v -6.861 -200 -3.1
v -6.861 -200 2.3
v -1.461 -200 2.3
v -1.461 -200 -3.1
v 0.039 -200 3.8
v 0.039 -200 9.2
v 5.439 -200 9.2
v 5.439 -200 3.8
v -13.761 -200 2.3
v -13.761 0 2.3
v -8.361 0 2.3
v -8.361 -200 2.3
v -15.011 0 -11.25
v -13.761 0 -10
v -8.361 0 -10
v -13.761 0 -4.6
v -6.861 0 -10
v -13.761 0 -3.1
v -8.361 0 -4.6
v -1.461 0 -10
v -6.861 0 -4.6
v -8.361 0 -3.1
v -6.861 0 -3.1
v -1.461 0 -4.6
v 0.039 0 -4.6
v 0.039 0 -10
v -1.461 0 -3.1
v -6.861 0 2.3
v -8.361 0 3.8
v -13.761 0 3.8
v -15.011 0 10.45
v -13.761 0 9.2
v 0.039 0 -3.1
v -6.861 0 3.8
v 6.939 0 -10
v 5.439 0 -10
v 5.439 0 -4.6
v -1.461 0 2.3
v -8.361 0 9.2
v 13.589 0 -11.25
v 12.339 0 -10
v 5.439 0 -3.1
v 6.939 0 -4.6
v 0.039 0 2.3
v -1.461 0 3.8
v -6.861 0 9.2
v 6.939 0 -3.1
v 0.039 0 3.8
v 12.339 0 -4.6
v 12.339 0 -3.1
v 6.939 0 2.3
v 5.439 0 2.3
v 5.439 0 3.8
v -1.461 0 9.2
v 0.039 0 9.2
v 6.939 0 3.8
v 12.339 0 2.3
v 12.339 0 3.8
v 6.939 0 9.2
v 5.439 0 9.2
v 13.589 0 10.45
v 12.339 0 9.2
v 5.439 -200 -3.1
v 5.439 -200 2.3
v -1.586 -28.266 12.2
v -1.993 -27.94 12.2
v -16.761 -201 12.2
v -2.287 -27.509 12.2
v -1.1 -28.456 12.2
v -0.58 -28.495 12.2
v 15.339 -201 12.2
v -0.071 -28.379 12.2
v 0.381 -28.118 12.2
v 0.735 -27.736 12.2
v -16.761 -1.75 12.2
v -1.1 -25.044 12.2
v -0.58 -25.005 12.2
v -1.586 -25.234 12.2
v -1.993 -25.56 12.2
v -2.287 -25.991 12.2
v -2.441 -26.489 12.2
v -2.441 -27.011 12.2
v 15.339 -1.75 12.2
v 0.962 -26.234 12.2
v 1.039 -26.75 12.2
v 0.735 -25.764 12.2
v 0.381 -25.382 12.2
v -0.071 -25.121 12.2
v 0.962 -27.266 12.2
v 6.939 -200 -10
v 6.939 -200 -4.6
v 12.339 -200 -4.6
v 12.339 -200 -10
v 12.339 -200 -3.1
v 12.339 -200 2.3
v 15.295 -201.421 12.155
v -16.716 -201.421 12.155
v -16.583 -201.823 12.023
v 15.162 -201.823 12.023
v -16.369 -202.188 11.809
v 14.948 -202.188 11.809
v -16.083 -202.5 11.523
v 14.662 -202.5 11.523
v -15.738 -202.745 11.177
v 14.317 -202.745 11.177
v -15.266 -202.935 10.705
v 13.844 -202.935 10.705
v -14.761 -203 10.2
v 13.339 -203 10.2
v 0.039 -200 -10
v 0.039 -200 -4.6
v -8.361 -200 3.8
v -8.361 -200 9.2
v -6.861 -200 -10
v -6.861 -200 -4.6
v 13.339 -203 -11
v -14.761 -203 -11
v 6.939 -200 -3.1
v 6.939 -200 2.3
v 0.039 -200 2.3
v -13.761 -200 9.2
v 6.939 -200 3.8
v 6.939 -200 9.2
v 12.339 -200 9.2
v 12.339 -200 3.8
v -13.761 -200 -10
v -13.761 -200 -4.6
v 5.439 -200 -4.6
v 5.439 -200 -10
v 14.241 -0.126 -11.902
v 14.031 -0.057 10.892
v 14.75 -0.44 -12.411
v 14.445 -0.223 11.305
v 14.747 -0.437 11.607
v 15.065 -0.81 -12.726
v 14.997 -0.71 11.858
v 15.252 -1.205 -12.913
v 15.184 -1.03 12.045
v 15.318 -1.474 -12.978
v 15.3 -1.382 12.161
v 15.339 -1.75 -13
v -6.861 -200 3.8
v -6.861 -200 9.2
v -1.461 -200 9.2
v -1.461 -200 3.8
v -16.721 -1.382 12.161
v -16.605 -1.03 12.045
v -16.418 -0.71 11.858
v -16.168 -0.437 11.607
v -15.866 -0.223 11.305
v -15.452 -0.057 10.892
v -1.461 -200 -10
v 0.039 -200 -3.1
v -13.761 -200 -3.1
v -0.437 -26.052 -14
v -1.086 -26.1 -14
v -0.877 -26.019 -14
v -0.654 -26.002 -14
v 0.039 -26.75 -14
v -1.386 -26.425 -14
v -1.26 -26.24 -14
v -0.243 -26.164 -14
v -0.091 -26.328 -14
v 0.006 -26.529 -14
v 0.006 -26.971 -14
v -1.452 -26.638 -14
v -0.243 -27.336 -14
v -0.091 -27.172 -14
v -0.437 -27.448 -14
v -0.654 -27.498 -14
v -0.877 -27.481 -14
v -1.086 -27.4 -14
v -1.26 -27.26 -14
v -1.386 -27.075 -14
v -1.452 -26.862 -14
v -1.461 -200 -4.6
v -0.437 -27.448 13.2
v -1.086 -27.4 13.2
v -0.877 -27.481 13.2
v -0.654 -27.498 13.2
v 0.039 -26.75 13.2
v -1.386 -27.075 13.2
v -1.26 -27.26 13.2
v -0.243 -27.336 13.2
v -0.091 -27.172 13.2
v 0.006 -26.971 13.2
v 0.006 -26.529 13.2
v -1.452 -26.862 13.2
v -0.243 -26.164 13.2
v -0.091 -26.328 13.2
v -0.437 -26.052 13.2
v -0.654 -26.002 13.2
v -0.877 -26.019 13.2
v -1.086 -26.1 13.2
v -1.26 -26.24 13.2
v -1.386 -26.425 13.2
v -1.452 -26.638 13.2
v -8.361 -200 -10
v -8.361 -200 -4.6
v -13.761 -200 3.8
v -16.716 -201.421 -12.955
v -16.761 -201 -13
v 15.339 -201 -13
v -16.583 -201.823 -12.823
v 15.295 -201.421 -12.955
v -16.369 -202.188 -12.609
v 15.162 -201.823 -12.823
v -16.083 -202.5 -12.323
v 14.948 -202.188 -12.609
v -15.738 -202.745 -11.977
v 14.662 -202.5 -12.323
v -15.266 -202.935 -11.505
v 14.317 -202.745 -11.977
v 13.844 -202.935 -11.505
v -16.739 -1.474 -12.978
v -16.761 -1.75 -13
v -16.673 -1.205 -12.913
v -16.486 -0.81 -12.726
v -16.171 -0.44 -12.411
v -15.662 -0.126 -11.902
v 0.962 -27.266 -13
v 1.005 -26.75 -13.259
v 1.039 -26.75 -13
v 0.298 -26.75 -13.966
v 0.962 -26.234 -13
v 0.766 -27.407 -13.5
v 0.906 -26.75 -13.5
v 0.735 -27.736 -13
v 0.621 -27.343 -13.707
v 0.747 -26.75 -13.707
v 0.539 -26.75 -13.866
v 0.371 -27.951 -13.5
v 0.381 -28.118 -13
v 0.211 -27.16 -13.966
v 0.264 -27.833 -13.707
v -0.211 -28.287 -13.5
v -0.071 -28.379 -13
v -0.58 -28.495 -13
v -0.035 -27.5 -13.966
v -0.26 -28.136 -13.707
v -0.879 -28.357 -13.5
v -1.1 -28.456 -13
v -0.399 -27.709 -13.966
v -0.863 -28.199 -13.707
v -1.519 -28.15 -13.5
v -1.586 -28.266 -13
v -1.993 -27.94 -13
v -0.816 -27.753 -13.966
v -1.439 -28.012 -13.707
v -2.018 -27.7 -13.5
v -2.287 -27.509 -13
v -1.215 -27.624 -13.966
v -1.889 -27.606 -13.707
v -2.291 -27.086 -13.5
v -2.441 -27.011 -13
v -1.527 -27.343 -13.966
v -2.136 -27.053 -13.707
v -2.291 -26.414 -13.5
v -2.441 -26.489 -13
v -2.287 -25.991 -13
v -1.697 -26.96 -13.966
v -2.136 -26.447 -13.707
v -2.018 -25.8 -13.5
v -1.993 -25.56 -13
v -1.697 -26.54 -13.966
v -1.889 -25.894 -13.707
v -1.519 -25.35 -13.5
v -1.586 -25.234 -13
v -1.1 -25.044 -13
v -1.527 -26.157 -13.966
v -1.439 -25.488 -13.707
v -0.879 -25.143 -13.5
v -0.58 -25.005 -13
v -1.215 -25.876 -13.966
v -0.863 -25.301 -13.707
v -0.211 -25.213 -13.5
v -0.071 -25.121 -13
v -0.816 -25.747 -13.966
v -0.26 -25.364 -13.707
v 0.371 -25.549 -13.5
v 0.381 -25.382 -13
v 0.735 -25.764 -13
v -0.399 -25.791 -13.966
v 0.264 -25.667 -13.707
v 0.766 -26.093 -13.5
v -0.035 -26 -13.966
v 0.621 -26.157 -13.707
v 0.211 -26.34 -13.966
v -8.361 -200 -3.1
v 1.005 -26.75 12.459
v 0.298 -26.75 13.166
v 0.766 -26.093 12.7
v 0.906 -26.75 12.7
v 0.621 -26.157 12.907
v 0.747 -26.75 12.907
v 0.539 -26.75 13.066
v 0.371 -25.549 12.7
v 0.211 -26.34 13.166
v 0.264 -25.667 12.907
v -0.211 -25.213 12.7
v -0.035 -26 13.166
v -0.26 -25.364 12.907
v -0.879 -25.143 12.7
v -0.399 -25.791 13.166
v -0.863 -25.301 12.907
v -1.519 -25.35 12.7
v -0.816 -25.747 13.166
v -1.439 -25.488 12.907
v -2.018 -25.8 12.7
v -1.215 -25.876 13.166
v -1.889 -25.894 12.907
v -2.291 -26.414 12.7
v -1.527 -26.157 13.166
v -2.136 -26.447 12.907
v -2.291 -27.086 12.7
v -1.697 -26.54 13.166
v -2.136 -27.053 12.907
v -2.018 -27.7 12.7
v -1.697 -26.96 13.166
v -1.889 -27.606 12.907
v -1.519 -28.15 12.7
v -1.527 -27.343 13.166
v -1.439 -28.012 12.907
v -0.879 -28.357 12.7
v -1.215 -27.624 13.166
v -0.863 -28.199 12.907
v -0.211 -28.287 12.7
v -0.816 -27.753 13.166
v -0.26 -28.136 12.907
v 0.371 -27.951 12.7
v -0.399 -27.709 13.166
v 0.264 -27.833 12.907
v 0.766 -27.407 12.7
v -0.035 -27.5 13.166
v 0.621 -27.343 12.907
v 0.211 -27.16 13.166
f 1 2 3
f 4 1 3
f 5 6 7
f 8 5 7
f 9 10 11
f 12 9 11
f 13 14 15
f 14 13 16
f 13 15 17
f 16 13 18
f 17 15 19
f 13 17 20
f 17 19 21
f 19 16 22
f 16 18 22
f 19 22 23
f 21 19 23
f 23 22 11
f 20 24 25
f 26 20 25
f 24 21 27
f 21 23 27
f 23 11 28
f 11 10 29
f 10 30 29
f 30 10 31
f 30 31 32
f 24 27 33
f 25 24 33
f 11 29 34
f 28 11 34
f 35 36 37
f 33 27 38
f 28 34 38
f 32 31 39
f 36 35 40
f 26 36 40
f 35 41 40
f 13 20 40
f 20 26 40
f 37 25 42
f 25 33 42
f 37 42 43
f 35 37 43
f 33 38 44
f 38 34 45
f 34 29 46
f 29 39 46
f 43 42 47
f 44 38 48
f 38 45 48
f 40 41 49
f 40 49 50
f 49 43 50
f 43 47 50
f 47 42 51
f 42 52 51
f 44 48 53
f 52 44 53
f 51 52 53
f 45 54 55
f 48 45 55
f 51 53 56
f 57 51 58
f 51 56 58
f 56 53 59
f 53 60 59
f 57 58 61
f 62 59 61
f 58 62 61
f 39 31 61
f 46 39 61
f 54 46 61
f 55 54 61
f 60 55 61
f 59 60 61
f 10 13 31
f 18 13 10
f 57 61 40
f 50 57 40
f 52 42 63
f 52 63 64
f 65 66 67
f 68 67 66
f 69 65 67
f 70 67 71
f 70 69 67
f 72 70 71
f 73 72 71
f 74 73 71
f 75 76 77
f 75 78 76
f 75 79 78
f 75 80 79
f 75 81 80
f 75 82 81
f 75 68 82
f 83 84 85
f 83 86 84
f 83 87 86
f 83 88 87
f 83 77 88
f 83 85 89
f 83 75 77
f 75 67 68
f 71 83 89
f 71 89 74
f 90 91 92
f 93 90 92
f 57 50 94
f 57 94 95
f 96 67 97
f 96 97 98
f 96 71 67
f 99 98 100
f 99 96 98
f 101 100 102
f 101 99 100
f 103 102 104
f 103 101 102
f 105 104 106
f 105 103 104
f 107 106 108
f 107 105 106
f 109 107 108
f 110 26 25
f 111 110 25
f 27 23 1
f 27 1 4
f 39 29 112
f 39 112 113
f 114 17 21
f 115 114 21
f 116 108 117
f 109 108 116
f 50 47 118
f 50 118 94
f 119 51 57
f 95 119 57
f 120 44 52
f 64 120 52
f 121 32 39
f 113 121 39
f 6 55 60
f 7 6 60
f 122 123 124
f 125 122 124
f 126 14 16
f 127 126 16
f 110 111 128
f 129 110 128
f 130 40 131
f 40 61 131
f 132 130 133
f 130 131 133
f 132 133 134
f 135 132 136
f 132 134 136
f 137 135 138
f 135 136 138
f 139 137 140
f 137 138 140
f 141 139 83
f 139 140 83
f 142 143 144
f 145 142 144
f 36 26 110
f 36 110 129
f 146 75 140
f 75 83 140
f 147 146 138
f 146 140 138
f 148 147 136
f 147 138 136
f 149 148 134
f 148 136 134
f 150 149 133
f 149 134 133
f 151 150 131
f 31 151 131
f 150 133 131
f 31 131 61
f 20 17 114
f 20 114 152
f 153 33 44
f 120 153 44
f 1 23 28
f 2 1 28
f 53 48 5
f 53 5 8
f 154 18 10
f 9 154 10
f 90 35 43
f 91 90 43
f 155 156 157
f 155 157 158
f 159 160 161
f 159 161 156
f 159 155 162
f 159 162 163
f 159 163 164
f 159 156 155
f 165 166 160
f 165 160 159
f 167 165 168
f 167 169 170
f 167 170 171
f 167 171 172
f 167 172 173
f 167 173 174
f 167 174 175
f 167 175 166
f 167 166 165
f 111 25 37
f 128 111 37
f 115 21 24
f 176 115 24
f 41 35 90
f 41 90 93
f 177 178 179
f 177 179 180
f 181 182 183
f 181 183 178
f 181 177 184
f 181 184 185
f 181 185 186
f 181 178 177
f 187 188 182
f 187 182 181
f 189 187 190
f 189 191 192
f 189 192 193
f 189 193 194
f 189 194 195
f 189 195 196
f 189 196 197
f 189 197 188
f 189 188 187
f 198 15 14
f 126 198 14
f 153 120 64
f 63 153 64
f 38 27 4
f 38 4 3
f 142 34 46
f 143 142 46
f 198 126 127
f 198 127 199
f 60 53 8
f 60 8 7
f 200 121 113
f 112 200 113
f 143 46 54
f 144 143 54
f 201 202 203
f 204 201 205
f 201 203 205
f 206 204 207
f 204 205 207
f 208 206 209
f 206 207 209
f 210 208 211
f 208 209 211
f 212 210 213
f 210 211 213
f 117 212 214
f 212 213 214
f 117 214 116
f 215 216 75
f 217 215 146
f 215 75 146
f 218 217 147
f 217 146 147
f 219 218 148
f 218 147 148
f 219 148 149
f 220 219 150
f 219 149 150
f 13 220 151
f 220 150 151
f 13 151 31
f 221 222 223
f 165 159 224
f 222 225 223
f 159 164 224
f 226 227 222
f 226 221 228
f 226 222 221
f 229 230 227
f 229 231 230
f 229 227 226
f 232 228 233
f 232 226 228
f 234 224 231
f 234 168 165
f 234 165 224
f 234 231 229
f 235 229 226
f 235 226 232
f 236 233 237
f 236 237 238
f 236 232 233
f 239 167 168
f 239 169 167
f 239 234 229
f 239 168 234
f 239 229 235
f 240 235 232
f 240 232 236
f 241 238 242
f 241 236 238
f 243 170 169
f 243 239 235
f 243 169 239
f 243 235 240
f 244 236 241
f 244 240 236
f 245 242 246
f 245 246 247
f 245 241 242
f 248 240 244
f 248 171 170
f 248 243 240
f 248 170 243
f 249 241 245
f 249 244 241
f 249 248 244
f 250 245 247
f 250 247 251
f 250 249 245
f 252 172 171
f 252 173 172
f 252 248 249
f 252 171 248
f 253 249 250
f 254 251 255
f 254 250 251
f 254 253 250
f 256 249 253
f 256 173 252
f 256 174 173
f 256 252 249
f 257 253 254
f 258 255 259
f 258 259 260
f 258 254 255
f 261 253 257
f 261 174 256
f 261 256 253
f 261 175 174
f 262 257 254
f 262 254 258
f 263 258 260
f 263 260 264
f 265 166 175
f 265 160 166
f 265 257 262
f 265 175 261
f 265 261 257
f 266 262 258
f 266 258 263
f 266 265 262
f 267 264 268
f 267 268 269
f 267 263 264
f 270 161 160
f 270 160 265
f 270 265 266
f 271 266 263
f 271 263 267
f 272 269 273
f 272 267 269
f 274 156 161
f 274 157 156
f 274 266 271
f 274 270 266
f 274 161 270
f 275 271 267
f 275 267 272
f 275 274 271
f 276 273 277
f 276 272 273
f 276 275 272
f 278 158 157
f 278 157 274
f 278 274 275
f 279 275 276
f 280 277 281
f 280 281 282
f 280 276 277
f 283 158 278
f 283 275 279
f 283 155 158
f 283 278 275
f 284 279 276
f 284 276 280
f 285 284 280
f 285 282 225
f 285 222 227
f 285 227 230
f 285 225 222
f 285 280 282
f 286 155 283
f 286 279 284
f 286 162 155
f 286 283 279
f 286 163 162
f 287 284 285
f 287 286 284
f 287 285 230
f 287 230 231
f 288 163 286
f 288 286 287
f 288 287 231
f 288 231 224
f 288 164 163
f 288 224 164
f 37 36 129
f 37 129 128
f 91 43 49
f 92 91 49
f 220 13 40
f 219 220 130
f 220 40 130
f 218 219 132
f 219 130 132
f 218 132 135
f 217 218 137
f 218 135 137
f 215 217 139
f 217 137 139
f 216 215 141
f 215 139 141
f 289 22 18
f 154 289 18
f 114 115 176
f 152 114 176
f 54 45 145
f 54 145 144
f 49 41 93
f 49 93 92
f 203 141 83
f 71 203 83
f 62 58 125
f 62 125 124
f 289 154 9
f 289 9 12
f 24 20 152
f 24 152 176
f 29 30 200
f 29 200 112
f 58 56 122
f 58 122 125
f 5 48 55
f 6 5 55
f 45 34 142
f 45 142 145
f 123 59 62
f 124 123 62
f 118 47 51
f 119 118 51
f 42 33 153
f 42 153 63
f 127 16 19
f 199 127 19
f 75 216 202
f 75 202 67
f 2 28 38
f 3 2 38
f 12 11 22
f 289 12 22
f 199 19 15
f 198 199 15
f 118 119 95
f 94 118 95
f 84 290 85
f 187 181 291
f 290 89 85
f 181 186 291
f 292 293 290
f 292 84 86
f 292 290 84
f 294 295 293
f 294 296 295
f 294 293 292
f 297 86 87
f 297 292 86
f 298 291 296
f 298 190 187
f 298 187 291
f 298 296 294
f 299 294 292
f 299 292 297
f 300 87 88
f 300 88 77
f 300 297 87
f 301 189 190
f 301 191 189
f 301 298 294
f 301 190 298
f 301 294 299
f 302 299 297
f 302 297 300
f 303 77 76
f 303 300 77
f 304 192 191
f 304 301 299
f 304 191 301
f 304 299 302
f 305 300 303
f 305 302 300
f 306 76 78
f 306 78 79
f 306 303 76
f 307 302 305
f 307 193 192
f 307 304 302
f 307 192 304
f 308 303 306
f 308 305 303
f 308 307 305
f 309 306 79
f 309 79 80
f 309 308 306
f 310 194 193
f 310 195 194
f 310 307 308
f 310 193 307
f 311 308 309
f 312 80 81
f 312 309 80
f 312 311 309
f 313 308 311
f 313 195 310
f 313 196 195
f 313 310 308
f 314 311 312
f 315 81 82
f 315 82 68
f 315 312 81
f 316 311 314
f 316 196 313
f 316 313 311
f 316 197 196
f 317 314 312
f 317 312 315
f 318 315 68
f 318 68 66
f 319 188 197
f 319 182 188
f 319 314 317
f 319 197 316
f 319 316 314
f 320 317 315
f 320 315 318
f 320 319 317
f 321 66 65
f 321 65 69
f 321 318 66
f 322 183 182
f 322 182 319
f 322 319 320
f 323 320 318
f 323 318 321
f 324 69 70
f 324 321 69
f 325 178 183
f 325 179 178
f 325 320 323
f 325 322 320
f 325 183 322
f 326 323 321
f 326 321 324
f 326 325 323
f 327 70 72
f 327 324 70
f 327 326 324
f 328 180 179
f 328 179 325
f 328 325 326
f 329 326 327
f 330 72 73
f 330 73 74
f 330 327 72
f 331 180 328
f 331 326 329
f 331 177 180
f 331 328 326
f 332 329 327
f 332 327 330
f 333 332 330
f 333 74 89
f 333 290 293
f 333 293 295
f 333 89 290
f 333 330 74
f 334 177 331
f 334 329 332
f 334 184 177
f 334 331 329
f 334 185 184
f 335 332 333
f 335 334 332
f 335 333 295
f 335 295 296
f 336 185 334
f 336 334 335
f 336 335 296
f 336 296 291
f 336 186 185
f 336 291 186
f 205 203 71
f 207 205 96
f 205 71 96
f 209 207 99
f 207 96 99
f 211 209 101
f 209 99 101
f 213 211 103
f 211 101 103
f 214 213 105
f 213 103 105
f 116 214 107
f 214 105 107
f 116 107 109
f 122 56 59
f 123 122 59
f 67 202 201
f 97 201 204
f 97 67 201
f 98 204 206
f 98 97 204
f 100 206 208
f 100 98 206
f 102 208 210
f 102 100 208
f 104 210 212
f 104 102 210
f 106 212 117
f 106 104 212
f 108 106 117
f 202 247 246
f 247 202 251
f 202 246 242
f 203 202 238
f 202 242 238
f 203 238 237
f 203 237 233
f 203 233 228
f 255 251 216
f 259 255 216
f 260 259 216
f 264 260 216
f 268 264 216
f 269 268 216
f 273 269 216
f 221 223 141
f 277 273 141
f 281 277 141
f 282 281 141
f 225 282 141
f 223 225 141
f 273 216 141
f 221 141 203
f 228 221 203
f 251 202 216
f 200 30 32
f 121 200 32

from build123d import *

# Parameters (mm, degrees)
F0_W      = 32.1
F0_H      = 25.2
F0_W_2    = 5.4
F0_H_2    = 5.4
F1_DEPTH  = 200
F3_W      = 32.1
F3_H      = 25.2
F4_DEPTH  = 3
F5_R      = 2
F6_R      = 1.75
F7_R      = 1.75
F8_DEPTH  = 1
F9_R      = 0.99999
F10_R     = 1.75
F11_DEPTH = 1
F12_R     = 0.99999


# Not quite as in the source:
# - a fillet or chamfer is up to 0.001 mm smaller than in the source, because OpenCascade refuses the exact size


with BuildPart() as f1:
    # F0 (on Front) → F1 (new body)
    with BuildSketch(Plane.XZ):
        with Locations((-0.710526225, -0.3999928176)):
            Rectangle(F0_W, F0_H)
        Polygon((-13.760526225, -6.9499006331), (-13.760526225, -4.5999928176), (-8.360526225, -4.5999928176), (-8.360526225, -9.9999928176), (-13.760526225, -9.9999928176), align=None, mode=Mode.SUBTRACT)
        with Locations((-4.160526225, -7.2999928176)):
            Rectangle(F0_W_2, F0_H_2, mode=Mode.SUBTRACT)
        Polygon((-13.760526225, -3.0999928176), (-13.760526225, 0.7499149978), (-13.760526225, 2.3000071824), (-8.360526225, 2.3000071824), (-8.360526225, -3.0999928176), align=None, mode=Mode.SUBTRACT)
        with Locations((-4.160526225, -0.3999928176)):
            Rectangle(F0_W_2, F0_H_2, mode=Mode.SUBTRACT)
        with Locations((2.739473775, -7.2999928176)):
            Rectangle(F0_W_2, F0_H_2, mode=Mode.SUBTRACT)
        with Locations((9.639473775, -7.2999928176)):
            Rectangle(F0_W_2, F0_H_2, mode=Mode.SUBTRACT)
        with Locations((2.739473775, -0.3999928176)):
            Rectangle(F0_W_2, F0_H_2, mode=Mode.SUBTRACT)
        with Locations((9.639473775, -0.3999928176)):
            Rectangle(F0_W_2, F0_H_2, mode=Mode.SUBTRACT)
        with Locations((-11.060526225, 6.5000071824)):
            Rectangle(F0_W_2, F0_H_2, mode=Mode.SUBTRACT)
        with Locations((-4.160526225, 6.5000071824)):
            Rectangle(F0_W_2, F0_H_2, mode=Mode.SUBTRACT)
        with Locations((2.739473775, 6.5000071824)):
            Rectangle(F0_W_2, F0_H_2, mode=Mode.SUBTRACT)
        with Locations((9.639473775, 6.5000071824)):
            Rectangle(F0_W_2, F0_H_2, mode=Mode.SUBTRACT)
    extrude(amount=F1_DEPTH)

    # F3 (on face) → F4 (join)
    with BuildSketch(Plane.XZ.offset(200)):
        with Locations((-0.710526225, -0.3999928176)):
            Rectangle(F3_W, F3_H)
    extrude(amount=F4_DEPTH)

    # F5
    f5_edges = [f1.edges().sort_by_distance(p)[0] for p in [
        (15.339474, -203, -0.399993),
        (-0.710526, -203, 12.200007),
        (-16.760526, -203, -0.399993),
        (-0.710526, -203, -12.999993),
    ]]
    fillet(f5_edges, radius=F5_R)

    # F6
    f6_edges = [f1.edges().sort_by_distance(p)[0] for p in [
        (-0.710526, 0, 12.200007),
        (15.339474, 0, -0.399993),
        (-0.710526, 0, -12.999993),
        (-16.760526, 0, -0.399993),
    ]]
    fillet(f6_edges, radius=F6_R)

    # F7 (on face) → F8 (join)
    with BuildSketch(Plane.XY.offset(12.2000071824)):
        with Locations((-0.710526225, -26.75)):
            Circle(F7_R)
    extrude(amount=F8_DEPTH)

    # F9 (radius 1 in the source; OpenCascade refuses exactly that, so slightly less here)
    f9_edges = [f1.edges().sort_by_distance(p)[0] for p in [
        (-2.460526, -26.75, 13.200007),
    ]]
    fillet(f9_edges, radius=F9_R)

    # F10 (on face) → F11 (join)
    with BuildSketch(Plane(origin=(0, 0, -12.9999928176), x_dir=(1, 0, 0), z_dir=(0, 0, -1))):
        with Locations((-0.710526225, 26.75)):
            Circle(F10_R)
    extrude(amount=F11_DEPTH)

    # F12 (radius 1 in the source; OpenCascade refuses exactly that, so slightly less here)
    f12_edges = [f1.edges().sort_by_distance(p)[0] for p in [
        (-2.460526, -26.75, -13.999993),
    ]]
    fillet(f12_edges, radius=F12_R)


solid = f1.part
